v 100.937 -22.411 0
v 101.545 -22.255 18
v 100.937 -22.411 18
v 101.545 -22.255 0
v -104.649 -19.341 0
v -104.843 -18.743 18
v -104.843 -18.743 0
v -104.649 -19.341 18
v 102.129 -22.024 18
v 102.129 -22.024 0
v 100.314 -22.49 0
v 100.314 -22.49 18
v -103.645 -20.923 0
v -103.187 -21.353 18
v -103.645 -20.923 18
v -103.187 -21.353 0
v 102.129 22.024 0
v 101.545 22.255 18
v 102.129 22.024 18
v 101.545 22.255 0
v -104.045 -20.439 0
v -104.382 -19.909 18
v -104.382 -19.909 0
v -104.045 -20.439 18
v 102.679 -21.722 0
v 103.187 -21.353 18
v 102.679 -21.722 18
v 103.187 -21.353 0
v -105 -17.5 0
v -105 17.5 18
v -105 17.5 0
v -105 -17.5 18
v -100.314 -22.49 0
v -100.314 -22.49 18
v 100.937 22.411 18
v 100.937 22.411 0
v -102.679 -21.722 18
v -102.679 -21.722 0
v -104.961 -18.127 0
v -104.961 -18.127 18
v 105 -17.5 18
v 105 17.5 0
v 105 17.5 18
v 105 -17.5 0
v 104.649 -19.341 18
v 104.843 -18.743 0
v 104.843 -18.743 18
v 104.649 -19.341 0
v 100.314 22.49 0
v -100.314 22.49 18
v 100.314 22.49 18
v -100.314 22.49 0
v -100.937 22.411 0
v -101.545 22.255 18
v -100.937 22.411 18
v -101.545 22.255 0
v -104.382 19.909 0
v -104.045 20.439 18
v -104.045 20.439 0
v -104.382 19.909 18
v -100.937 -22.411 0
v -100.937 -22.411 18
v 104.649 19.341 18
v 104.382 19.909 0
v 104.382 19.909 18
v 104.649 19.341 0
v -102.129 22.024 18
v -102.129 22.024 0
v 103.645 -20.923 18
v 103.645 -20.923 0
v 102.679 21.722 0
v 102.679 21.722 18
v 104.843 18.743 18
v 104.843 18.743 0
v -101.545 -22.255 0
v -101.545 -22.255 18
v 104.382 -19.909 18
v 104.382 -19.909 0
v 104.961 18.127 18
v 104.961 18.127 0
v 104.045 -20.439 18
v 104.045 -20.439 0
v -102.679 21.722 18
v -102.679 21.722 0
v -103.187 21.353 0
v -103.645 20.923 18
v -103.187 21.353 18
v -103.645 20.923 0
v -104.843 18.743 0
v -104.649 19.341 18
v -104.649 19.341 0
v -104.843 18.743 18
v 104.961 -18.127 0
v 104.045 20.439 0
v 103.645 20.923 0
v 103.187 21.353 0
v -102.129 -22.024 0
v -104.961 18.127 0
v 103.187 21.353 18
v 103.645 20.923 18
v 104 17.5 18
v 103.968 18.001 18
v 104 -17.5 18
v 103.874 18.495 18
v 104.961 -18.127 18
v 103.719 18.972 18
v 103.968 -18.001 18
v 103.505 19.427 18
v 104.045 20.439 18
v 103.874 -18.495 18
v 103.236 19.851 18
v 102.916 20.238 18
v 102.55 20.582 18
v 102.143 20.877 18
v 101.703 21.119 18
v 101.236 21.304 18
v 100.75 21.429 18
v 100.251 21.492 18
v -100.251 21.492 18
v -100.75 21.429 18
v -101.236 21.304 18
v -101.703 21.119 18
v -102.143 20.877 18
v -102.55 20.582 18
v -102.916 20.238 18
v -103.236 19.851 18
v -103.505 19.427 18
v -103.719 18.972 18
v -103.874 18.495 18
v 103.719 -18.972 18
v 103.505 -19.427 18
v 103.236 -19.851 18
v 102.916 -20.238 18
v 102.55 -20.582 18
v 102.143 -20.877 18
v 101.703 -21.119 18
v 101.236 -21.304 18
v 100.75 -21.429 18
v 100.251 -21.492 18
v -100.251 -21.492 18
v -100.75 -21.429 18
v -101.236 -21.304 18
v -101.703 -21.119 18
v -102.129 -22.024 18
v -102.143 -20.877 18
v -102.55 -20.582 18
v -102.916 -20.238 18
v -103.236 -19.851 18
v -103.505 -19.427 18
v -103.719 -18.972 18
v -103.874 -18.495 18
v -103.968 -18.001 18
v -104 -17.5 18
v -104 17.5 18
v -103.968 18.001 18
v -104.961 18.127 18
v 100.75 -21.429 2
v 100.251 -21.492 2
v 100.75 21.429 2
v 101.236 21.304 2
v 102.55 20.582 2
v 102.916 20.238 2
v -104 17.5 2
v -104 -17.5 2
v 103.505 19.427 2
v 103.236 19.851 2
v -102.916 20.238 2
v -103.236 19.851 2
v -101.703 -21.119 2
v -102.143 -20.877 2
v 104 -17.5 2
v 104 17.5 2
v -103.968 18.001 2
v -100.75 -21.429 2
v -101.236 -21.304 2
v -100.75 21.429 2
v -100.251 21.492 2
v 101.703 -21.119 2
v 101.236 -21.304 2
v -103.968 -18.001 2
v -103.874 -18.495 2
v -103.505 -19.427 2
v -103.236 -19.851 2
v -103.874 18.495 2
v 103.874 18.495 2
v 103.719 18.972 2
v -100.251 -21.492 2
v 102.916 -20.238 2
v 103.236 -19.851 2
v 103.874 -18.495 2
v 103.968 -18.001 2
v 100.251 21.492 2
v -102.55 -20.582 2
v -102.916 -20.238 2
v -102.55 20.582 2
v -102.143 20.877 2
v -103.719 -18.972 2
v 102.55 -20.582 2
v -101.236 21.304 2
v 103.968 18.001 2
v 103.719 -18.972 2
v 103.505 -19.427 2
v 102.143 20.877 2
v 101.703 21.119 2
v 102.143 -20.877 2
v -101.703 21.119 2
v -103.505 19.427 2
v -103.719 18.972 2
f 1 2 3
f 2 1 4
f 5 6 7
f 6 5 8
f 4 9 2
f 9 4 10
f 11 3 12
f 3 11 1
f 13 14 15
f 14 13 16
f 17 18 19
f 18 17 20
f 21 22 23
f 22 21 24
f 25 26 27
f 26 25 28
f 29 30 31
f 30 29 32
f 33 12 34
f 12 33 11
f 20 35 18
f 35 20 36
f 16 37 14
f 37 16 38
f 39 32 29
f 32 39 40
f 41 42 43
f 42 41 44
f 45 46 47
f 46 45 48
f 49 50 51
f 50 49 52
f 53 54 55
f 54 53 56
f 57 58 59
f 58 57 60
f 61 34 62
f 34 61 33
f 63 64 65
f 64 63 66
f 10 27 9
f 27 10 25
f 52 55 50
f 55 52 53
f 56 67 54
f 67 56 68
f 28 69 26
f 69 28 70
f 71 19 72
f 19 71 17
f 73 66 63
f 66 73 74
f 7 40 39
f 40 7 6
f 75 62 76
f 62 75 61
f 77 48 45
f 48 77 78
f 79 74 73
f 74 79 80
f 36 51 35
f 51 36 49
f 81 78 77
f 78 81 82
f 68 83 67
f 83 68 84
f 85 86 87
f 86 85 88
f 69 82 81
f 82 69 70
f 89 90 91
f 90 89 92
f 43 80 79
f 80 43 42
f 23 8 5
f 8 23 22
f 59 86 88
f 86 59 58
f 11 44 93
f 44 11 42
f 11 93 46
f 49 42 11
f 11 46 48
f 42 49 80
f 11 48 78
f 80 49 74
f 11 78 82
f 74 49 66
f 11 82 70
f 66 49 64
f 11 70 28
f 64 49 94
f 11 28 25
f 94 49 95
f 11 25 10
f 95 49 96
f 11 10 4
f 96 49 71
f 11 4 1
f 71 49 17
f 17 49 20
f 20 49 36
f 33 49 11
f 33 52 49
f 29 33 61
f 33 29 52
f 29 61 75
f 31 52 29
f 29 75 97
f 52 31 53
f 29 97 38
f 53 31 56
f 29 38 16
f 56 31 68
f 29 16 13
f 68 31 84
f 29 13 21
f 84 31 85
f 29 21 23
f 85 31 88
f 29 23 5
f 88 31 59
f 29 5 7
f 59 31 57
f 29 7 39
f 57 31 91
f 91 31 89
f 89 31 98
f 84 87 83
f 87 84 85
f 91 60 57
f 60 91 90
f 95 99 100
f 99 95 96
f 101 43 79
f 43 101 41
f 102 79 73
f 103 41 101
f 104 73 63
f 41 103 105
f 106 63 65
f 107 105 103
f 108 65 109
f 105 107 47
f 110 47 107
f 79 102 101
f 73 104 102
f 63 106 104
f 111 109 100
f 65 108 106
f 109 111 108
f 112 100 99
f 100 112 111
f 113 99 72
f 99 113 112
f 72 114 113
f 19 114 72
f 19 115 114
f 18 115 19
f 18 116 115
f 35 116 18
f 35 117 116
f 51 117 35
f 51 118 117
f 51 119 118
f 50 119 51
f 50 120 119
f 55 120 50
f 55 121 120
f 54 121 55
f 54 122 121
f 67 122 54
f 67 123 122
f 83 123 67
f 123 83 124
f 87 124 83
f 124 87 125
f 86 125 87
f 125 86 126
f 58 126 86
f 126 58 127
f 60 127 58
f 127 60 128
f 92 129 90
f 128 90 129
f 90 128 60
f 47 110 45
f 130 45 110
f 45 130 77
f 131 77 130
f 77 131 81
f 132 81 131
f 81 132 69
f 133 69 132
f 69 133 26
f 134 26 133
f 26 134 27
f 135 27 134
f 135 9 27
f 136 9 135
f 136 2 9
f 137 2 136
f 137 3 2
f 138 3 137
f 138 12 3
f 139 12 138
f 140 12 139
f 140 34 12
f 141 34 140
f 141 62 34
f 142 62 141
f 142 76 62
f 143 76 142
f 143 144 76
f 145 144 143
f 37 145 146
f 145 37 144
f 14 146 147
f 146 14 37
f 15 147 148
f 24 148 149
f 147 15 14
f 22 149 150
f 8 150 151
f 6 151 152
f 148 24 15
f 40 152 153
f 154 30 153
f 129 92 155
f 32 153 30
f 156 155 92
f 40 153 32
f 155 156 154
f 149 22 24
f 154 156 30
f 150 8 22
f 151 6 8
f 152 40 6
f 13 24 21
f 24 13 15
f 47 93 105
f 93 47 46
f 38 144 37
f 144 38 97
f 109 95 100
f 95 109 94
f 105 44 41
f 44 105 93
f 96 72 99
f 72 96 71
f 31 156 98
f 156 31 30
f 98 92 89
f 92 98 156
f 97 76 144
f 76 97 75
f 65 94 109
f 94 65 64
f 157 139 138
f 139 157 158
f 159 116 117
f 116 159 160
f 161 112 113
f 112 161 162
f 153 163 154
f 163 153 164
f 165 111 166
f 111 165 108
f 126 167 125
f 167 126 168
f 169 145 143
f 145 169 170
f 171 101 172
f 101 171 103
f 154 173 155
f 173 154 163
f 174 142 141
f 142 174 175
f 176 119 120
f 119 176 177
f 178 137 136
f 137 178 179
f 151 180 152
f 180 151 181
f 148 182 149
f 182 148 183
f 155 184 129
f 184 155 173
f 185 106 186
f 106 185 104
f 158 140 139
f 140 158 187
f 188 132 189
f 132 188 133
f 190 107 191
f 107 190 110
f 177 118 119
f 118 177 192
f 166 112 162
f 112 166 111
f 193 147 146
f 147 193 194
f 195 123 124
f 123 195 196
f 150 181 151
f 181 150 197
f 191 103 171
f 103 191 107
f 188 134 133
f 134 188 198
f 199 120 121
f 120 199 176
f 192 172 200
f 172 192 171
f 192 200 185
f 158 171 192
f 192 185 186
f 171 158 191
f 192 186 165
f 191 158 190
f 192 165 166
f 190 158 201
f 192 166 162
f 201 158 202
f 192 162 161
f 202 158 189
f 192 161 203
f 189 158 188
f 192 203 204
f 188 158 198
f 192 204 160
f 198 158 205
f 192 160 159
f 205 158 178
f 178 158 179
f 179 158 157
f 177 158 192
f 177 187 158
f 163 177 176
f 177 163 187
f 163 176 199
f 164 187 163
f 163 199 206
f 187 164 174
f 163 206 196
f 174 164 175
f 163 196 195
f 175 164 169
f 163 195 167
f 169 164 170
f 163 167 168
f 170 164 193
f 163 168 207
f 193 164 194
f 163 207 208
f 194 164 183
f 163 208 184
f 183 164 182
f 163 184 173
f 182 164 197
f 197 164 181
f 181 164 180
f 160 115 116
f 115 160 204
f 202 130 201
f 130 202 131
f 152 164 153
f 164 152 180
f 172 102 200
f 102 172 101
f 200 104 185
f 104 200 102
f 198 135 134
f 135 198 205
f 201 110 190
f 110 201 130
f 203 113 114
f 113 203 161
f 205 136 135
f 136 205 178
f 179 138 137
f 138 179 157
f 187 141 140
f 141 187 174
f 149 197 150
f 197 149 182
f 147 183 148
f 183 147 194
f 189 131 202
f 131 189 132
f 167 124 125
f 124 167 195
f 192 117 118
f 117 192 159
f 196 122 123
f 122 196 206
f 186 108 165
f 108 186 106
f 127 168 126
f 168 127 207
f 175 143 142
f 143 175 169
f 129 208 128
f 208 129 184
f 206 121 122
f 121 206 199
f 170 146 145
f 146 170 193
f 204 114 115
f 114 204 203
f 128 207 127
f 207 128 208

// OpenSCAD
$fn = 50;


difference() {
	union() {
		hull() {
			translate(v = [-100.0000000000, 17.5000000000, 0]) {
				cylinder(h = 18, r = 5);
			}
			translate(v = [100.0000000000, 17.5000000000, 0]) {
				cylinder(h = 18, r = 5);
			}
			translate(v = [-100.0000000000, -17.5000000000, 0]) {
				cylinder(h = 18, r = 5);
			}
			translate(v = [100.0000000000, -17.5000000000, 0]) {
				cylinder(h = 18, r = 5);
			}
		}
	}
	union() {
		translate(v = [0, 0, 2]) {
			hull() {
				translate(v = [-100.0000000000, 17.5000000000, 0]) {
					cylinder(h = 16, r = 4);
				}
				translate(v = [100.0000000000, 17.5000000000, 0]) {
					cylinder(h = 16, r = 4);
				}
				translate(v = [-100.0000000000, -17.5000000000, 0]) {
					cylinder(h = 16, r = 4);
				}
				translate(v = [100.0000000000, -17.5000000000, 0]) {
					cylinder(h = 16, r = 4);
				}
			}
		}
	}
}
